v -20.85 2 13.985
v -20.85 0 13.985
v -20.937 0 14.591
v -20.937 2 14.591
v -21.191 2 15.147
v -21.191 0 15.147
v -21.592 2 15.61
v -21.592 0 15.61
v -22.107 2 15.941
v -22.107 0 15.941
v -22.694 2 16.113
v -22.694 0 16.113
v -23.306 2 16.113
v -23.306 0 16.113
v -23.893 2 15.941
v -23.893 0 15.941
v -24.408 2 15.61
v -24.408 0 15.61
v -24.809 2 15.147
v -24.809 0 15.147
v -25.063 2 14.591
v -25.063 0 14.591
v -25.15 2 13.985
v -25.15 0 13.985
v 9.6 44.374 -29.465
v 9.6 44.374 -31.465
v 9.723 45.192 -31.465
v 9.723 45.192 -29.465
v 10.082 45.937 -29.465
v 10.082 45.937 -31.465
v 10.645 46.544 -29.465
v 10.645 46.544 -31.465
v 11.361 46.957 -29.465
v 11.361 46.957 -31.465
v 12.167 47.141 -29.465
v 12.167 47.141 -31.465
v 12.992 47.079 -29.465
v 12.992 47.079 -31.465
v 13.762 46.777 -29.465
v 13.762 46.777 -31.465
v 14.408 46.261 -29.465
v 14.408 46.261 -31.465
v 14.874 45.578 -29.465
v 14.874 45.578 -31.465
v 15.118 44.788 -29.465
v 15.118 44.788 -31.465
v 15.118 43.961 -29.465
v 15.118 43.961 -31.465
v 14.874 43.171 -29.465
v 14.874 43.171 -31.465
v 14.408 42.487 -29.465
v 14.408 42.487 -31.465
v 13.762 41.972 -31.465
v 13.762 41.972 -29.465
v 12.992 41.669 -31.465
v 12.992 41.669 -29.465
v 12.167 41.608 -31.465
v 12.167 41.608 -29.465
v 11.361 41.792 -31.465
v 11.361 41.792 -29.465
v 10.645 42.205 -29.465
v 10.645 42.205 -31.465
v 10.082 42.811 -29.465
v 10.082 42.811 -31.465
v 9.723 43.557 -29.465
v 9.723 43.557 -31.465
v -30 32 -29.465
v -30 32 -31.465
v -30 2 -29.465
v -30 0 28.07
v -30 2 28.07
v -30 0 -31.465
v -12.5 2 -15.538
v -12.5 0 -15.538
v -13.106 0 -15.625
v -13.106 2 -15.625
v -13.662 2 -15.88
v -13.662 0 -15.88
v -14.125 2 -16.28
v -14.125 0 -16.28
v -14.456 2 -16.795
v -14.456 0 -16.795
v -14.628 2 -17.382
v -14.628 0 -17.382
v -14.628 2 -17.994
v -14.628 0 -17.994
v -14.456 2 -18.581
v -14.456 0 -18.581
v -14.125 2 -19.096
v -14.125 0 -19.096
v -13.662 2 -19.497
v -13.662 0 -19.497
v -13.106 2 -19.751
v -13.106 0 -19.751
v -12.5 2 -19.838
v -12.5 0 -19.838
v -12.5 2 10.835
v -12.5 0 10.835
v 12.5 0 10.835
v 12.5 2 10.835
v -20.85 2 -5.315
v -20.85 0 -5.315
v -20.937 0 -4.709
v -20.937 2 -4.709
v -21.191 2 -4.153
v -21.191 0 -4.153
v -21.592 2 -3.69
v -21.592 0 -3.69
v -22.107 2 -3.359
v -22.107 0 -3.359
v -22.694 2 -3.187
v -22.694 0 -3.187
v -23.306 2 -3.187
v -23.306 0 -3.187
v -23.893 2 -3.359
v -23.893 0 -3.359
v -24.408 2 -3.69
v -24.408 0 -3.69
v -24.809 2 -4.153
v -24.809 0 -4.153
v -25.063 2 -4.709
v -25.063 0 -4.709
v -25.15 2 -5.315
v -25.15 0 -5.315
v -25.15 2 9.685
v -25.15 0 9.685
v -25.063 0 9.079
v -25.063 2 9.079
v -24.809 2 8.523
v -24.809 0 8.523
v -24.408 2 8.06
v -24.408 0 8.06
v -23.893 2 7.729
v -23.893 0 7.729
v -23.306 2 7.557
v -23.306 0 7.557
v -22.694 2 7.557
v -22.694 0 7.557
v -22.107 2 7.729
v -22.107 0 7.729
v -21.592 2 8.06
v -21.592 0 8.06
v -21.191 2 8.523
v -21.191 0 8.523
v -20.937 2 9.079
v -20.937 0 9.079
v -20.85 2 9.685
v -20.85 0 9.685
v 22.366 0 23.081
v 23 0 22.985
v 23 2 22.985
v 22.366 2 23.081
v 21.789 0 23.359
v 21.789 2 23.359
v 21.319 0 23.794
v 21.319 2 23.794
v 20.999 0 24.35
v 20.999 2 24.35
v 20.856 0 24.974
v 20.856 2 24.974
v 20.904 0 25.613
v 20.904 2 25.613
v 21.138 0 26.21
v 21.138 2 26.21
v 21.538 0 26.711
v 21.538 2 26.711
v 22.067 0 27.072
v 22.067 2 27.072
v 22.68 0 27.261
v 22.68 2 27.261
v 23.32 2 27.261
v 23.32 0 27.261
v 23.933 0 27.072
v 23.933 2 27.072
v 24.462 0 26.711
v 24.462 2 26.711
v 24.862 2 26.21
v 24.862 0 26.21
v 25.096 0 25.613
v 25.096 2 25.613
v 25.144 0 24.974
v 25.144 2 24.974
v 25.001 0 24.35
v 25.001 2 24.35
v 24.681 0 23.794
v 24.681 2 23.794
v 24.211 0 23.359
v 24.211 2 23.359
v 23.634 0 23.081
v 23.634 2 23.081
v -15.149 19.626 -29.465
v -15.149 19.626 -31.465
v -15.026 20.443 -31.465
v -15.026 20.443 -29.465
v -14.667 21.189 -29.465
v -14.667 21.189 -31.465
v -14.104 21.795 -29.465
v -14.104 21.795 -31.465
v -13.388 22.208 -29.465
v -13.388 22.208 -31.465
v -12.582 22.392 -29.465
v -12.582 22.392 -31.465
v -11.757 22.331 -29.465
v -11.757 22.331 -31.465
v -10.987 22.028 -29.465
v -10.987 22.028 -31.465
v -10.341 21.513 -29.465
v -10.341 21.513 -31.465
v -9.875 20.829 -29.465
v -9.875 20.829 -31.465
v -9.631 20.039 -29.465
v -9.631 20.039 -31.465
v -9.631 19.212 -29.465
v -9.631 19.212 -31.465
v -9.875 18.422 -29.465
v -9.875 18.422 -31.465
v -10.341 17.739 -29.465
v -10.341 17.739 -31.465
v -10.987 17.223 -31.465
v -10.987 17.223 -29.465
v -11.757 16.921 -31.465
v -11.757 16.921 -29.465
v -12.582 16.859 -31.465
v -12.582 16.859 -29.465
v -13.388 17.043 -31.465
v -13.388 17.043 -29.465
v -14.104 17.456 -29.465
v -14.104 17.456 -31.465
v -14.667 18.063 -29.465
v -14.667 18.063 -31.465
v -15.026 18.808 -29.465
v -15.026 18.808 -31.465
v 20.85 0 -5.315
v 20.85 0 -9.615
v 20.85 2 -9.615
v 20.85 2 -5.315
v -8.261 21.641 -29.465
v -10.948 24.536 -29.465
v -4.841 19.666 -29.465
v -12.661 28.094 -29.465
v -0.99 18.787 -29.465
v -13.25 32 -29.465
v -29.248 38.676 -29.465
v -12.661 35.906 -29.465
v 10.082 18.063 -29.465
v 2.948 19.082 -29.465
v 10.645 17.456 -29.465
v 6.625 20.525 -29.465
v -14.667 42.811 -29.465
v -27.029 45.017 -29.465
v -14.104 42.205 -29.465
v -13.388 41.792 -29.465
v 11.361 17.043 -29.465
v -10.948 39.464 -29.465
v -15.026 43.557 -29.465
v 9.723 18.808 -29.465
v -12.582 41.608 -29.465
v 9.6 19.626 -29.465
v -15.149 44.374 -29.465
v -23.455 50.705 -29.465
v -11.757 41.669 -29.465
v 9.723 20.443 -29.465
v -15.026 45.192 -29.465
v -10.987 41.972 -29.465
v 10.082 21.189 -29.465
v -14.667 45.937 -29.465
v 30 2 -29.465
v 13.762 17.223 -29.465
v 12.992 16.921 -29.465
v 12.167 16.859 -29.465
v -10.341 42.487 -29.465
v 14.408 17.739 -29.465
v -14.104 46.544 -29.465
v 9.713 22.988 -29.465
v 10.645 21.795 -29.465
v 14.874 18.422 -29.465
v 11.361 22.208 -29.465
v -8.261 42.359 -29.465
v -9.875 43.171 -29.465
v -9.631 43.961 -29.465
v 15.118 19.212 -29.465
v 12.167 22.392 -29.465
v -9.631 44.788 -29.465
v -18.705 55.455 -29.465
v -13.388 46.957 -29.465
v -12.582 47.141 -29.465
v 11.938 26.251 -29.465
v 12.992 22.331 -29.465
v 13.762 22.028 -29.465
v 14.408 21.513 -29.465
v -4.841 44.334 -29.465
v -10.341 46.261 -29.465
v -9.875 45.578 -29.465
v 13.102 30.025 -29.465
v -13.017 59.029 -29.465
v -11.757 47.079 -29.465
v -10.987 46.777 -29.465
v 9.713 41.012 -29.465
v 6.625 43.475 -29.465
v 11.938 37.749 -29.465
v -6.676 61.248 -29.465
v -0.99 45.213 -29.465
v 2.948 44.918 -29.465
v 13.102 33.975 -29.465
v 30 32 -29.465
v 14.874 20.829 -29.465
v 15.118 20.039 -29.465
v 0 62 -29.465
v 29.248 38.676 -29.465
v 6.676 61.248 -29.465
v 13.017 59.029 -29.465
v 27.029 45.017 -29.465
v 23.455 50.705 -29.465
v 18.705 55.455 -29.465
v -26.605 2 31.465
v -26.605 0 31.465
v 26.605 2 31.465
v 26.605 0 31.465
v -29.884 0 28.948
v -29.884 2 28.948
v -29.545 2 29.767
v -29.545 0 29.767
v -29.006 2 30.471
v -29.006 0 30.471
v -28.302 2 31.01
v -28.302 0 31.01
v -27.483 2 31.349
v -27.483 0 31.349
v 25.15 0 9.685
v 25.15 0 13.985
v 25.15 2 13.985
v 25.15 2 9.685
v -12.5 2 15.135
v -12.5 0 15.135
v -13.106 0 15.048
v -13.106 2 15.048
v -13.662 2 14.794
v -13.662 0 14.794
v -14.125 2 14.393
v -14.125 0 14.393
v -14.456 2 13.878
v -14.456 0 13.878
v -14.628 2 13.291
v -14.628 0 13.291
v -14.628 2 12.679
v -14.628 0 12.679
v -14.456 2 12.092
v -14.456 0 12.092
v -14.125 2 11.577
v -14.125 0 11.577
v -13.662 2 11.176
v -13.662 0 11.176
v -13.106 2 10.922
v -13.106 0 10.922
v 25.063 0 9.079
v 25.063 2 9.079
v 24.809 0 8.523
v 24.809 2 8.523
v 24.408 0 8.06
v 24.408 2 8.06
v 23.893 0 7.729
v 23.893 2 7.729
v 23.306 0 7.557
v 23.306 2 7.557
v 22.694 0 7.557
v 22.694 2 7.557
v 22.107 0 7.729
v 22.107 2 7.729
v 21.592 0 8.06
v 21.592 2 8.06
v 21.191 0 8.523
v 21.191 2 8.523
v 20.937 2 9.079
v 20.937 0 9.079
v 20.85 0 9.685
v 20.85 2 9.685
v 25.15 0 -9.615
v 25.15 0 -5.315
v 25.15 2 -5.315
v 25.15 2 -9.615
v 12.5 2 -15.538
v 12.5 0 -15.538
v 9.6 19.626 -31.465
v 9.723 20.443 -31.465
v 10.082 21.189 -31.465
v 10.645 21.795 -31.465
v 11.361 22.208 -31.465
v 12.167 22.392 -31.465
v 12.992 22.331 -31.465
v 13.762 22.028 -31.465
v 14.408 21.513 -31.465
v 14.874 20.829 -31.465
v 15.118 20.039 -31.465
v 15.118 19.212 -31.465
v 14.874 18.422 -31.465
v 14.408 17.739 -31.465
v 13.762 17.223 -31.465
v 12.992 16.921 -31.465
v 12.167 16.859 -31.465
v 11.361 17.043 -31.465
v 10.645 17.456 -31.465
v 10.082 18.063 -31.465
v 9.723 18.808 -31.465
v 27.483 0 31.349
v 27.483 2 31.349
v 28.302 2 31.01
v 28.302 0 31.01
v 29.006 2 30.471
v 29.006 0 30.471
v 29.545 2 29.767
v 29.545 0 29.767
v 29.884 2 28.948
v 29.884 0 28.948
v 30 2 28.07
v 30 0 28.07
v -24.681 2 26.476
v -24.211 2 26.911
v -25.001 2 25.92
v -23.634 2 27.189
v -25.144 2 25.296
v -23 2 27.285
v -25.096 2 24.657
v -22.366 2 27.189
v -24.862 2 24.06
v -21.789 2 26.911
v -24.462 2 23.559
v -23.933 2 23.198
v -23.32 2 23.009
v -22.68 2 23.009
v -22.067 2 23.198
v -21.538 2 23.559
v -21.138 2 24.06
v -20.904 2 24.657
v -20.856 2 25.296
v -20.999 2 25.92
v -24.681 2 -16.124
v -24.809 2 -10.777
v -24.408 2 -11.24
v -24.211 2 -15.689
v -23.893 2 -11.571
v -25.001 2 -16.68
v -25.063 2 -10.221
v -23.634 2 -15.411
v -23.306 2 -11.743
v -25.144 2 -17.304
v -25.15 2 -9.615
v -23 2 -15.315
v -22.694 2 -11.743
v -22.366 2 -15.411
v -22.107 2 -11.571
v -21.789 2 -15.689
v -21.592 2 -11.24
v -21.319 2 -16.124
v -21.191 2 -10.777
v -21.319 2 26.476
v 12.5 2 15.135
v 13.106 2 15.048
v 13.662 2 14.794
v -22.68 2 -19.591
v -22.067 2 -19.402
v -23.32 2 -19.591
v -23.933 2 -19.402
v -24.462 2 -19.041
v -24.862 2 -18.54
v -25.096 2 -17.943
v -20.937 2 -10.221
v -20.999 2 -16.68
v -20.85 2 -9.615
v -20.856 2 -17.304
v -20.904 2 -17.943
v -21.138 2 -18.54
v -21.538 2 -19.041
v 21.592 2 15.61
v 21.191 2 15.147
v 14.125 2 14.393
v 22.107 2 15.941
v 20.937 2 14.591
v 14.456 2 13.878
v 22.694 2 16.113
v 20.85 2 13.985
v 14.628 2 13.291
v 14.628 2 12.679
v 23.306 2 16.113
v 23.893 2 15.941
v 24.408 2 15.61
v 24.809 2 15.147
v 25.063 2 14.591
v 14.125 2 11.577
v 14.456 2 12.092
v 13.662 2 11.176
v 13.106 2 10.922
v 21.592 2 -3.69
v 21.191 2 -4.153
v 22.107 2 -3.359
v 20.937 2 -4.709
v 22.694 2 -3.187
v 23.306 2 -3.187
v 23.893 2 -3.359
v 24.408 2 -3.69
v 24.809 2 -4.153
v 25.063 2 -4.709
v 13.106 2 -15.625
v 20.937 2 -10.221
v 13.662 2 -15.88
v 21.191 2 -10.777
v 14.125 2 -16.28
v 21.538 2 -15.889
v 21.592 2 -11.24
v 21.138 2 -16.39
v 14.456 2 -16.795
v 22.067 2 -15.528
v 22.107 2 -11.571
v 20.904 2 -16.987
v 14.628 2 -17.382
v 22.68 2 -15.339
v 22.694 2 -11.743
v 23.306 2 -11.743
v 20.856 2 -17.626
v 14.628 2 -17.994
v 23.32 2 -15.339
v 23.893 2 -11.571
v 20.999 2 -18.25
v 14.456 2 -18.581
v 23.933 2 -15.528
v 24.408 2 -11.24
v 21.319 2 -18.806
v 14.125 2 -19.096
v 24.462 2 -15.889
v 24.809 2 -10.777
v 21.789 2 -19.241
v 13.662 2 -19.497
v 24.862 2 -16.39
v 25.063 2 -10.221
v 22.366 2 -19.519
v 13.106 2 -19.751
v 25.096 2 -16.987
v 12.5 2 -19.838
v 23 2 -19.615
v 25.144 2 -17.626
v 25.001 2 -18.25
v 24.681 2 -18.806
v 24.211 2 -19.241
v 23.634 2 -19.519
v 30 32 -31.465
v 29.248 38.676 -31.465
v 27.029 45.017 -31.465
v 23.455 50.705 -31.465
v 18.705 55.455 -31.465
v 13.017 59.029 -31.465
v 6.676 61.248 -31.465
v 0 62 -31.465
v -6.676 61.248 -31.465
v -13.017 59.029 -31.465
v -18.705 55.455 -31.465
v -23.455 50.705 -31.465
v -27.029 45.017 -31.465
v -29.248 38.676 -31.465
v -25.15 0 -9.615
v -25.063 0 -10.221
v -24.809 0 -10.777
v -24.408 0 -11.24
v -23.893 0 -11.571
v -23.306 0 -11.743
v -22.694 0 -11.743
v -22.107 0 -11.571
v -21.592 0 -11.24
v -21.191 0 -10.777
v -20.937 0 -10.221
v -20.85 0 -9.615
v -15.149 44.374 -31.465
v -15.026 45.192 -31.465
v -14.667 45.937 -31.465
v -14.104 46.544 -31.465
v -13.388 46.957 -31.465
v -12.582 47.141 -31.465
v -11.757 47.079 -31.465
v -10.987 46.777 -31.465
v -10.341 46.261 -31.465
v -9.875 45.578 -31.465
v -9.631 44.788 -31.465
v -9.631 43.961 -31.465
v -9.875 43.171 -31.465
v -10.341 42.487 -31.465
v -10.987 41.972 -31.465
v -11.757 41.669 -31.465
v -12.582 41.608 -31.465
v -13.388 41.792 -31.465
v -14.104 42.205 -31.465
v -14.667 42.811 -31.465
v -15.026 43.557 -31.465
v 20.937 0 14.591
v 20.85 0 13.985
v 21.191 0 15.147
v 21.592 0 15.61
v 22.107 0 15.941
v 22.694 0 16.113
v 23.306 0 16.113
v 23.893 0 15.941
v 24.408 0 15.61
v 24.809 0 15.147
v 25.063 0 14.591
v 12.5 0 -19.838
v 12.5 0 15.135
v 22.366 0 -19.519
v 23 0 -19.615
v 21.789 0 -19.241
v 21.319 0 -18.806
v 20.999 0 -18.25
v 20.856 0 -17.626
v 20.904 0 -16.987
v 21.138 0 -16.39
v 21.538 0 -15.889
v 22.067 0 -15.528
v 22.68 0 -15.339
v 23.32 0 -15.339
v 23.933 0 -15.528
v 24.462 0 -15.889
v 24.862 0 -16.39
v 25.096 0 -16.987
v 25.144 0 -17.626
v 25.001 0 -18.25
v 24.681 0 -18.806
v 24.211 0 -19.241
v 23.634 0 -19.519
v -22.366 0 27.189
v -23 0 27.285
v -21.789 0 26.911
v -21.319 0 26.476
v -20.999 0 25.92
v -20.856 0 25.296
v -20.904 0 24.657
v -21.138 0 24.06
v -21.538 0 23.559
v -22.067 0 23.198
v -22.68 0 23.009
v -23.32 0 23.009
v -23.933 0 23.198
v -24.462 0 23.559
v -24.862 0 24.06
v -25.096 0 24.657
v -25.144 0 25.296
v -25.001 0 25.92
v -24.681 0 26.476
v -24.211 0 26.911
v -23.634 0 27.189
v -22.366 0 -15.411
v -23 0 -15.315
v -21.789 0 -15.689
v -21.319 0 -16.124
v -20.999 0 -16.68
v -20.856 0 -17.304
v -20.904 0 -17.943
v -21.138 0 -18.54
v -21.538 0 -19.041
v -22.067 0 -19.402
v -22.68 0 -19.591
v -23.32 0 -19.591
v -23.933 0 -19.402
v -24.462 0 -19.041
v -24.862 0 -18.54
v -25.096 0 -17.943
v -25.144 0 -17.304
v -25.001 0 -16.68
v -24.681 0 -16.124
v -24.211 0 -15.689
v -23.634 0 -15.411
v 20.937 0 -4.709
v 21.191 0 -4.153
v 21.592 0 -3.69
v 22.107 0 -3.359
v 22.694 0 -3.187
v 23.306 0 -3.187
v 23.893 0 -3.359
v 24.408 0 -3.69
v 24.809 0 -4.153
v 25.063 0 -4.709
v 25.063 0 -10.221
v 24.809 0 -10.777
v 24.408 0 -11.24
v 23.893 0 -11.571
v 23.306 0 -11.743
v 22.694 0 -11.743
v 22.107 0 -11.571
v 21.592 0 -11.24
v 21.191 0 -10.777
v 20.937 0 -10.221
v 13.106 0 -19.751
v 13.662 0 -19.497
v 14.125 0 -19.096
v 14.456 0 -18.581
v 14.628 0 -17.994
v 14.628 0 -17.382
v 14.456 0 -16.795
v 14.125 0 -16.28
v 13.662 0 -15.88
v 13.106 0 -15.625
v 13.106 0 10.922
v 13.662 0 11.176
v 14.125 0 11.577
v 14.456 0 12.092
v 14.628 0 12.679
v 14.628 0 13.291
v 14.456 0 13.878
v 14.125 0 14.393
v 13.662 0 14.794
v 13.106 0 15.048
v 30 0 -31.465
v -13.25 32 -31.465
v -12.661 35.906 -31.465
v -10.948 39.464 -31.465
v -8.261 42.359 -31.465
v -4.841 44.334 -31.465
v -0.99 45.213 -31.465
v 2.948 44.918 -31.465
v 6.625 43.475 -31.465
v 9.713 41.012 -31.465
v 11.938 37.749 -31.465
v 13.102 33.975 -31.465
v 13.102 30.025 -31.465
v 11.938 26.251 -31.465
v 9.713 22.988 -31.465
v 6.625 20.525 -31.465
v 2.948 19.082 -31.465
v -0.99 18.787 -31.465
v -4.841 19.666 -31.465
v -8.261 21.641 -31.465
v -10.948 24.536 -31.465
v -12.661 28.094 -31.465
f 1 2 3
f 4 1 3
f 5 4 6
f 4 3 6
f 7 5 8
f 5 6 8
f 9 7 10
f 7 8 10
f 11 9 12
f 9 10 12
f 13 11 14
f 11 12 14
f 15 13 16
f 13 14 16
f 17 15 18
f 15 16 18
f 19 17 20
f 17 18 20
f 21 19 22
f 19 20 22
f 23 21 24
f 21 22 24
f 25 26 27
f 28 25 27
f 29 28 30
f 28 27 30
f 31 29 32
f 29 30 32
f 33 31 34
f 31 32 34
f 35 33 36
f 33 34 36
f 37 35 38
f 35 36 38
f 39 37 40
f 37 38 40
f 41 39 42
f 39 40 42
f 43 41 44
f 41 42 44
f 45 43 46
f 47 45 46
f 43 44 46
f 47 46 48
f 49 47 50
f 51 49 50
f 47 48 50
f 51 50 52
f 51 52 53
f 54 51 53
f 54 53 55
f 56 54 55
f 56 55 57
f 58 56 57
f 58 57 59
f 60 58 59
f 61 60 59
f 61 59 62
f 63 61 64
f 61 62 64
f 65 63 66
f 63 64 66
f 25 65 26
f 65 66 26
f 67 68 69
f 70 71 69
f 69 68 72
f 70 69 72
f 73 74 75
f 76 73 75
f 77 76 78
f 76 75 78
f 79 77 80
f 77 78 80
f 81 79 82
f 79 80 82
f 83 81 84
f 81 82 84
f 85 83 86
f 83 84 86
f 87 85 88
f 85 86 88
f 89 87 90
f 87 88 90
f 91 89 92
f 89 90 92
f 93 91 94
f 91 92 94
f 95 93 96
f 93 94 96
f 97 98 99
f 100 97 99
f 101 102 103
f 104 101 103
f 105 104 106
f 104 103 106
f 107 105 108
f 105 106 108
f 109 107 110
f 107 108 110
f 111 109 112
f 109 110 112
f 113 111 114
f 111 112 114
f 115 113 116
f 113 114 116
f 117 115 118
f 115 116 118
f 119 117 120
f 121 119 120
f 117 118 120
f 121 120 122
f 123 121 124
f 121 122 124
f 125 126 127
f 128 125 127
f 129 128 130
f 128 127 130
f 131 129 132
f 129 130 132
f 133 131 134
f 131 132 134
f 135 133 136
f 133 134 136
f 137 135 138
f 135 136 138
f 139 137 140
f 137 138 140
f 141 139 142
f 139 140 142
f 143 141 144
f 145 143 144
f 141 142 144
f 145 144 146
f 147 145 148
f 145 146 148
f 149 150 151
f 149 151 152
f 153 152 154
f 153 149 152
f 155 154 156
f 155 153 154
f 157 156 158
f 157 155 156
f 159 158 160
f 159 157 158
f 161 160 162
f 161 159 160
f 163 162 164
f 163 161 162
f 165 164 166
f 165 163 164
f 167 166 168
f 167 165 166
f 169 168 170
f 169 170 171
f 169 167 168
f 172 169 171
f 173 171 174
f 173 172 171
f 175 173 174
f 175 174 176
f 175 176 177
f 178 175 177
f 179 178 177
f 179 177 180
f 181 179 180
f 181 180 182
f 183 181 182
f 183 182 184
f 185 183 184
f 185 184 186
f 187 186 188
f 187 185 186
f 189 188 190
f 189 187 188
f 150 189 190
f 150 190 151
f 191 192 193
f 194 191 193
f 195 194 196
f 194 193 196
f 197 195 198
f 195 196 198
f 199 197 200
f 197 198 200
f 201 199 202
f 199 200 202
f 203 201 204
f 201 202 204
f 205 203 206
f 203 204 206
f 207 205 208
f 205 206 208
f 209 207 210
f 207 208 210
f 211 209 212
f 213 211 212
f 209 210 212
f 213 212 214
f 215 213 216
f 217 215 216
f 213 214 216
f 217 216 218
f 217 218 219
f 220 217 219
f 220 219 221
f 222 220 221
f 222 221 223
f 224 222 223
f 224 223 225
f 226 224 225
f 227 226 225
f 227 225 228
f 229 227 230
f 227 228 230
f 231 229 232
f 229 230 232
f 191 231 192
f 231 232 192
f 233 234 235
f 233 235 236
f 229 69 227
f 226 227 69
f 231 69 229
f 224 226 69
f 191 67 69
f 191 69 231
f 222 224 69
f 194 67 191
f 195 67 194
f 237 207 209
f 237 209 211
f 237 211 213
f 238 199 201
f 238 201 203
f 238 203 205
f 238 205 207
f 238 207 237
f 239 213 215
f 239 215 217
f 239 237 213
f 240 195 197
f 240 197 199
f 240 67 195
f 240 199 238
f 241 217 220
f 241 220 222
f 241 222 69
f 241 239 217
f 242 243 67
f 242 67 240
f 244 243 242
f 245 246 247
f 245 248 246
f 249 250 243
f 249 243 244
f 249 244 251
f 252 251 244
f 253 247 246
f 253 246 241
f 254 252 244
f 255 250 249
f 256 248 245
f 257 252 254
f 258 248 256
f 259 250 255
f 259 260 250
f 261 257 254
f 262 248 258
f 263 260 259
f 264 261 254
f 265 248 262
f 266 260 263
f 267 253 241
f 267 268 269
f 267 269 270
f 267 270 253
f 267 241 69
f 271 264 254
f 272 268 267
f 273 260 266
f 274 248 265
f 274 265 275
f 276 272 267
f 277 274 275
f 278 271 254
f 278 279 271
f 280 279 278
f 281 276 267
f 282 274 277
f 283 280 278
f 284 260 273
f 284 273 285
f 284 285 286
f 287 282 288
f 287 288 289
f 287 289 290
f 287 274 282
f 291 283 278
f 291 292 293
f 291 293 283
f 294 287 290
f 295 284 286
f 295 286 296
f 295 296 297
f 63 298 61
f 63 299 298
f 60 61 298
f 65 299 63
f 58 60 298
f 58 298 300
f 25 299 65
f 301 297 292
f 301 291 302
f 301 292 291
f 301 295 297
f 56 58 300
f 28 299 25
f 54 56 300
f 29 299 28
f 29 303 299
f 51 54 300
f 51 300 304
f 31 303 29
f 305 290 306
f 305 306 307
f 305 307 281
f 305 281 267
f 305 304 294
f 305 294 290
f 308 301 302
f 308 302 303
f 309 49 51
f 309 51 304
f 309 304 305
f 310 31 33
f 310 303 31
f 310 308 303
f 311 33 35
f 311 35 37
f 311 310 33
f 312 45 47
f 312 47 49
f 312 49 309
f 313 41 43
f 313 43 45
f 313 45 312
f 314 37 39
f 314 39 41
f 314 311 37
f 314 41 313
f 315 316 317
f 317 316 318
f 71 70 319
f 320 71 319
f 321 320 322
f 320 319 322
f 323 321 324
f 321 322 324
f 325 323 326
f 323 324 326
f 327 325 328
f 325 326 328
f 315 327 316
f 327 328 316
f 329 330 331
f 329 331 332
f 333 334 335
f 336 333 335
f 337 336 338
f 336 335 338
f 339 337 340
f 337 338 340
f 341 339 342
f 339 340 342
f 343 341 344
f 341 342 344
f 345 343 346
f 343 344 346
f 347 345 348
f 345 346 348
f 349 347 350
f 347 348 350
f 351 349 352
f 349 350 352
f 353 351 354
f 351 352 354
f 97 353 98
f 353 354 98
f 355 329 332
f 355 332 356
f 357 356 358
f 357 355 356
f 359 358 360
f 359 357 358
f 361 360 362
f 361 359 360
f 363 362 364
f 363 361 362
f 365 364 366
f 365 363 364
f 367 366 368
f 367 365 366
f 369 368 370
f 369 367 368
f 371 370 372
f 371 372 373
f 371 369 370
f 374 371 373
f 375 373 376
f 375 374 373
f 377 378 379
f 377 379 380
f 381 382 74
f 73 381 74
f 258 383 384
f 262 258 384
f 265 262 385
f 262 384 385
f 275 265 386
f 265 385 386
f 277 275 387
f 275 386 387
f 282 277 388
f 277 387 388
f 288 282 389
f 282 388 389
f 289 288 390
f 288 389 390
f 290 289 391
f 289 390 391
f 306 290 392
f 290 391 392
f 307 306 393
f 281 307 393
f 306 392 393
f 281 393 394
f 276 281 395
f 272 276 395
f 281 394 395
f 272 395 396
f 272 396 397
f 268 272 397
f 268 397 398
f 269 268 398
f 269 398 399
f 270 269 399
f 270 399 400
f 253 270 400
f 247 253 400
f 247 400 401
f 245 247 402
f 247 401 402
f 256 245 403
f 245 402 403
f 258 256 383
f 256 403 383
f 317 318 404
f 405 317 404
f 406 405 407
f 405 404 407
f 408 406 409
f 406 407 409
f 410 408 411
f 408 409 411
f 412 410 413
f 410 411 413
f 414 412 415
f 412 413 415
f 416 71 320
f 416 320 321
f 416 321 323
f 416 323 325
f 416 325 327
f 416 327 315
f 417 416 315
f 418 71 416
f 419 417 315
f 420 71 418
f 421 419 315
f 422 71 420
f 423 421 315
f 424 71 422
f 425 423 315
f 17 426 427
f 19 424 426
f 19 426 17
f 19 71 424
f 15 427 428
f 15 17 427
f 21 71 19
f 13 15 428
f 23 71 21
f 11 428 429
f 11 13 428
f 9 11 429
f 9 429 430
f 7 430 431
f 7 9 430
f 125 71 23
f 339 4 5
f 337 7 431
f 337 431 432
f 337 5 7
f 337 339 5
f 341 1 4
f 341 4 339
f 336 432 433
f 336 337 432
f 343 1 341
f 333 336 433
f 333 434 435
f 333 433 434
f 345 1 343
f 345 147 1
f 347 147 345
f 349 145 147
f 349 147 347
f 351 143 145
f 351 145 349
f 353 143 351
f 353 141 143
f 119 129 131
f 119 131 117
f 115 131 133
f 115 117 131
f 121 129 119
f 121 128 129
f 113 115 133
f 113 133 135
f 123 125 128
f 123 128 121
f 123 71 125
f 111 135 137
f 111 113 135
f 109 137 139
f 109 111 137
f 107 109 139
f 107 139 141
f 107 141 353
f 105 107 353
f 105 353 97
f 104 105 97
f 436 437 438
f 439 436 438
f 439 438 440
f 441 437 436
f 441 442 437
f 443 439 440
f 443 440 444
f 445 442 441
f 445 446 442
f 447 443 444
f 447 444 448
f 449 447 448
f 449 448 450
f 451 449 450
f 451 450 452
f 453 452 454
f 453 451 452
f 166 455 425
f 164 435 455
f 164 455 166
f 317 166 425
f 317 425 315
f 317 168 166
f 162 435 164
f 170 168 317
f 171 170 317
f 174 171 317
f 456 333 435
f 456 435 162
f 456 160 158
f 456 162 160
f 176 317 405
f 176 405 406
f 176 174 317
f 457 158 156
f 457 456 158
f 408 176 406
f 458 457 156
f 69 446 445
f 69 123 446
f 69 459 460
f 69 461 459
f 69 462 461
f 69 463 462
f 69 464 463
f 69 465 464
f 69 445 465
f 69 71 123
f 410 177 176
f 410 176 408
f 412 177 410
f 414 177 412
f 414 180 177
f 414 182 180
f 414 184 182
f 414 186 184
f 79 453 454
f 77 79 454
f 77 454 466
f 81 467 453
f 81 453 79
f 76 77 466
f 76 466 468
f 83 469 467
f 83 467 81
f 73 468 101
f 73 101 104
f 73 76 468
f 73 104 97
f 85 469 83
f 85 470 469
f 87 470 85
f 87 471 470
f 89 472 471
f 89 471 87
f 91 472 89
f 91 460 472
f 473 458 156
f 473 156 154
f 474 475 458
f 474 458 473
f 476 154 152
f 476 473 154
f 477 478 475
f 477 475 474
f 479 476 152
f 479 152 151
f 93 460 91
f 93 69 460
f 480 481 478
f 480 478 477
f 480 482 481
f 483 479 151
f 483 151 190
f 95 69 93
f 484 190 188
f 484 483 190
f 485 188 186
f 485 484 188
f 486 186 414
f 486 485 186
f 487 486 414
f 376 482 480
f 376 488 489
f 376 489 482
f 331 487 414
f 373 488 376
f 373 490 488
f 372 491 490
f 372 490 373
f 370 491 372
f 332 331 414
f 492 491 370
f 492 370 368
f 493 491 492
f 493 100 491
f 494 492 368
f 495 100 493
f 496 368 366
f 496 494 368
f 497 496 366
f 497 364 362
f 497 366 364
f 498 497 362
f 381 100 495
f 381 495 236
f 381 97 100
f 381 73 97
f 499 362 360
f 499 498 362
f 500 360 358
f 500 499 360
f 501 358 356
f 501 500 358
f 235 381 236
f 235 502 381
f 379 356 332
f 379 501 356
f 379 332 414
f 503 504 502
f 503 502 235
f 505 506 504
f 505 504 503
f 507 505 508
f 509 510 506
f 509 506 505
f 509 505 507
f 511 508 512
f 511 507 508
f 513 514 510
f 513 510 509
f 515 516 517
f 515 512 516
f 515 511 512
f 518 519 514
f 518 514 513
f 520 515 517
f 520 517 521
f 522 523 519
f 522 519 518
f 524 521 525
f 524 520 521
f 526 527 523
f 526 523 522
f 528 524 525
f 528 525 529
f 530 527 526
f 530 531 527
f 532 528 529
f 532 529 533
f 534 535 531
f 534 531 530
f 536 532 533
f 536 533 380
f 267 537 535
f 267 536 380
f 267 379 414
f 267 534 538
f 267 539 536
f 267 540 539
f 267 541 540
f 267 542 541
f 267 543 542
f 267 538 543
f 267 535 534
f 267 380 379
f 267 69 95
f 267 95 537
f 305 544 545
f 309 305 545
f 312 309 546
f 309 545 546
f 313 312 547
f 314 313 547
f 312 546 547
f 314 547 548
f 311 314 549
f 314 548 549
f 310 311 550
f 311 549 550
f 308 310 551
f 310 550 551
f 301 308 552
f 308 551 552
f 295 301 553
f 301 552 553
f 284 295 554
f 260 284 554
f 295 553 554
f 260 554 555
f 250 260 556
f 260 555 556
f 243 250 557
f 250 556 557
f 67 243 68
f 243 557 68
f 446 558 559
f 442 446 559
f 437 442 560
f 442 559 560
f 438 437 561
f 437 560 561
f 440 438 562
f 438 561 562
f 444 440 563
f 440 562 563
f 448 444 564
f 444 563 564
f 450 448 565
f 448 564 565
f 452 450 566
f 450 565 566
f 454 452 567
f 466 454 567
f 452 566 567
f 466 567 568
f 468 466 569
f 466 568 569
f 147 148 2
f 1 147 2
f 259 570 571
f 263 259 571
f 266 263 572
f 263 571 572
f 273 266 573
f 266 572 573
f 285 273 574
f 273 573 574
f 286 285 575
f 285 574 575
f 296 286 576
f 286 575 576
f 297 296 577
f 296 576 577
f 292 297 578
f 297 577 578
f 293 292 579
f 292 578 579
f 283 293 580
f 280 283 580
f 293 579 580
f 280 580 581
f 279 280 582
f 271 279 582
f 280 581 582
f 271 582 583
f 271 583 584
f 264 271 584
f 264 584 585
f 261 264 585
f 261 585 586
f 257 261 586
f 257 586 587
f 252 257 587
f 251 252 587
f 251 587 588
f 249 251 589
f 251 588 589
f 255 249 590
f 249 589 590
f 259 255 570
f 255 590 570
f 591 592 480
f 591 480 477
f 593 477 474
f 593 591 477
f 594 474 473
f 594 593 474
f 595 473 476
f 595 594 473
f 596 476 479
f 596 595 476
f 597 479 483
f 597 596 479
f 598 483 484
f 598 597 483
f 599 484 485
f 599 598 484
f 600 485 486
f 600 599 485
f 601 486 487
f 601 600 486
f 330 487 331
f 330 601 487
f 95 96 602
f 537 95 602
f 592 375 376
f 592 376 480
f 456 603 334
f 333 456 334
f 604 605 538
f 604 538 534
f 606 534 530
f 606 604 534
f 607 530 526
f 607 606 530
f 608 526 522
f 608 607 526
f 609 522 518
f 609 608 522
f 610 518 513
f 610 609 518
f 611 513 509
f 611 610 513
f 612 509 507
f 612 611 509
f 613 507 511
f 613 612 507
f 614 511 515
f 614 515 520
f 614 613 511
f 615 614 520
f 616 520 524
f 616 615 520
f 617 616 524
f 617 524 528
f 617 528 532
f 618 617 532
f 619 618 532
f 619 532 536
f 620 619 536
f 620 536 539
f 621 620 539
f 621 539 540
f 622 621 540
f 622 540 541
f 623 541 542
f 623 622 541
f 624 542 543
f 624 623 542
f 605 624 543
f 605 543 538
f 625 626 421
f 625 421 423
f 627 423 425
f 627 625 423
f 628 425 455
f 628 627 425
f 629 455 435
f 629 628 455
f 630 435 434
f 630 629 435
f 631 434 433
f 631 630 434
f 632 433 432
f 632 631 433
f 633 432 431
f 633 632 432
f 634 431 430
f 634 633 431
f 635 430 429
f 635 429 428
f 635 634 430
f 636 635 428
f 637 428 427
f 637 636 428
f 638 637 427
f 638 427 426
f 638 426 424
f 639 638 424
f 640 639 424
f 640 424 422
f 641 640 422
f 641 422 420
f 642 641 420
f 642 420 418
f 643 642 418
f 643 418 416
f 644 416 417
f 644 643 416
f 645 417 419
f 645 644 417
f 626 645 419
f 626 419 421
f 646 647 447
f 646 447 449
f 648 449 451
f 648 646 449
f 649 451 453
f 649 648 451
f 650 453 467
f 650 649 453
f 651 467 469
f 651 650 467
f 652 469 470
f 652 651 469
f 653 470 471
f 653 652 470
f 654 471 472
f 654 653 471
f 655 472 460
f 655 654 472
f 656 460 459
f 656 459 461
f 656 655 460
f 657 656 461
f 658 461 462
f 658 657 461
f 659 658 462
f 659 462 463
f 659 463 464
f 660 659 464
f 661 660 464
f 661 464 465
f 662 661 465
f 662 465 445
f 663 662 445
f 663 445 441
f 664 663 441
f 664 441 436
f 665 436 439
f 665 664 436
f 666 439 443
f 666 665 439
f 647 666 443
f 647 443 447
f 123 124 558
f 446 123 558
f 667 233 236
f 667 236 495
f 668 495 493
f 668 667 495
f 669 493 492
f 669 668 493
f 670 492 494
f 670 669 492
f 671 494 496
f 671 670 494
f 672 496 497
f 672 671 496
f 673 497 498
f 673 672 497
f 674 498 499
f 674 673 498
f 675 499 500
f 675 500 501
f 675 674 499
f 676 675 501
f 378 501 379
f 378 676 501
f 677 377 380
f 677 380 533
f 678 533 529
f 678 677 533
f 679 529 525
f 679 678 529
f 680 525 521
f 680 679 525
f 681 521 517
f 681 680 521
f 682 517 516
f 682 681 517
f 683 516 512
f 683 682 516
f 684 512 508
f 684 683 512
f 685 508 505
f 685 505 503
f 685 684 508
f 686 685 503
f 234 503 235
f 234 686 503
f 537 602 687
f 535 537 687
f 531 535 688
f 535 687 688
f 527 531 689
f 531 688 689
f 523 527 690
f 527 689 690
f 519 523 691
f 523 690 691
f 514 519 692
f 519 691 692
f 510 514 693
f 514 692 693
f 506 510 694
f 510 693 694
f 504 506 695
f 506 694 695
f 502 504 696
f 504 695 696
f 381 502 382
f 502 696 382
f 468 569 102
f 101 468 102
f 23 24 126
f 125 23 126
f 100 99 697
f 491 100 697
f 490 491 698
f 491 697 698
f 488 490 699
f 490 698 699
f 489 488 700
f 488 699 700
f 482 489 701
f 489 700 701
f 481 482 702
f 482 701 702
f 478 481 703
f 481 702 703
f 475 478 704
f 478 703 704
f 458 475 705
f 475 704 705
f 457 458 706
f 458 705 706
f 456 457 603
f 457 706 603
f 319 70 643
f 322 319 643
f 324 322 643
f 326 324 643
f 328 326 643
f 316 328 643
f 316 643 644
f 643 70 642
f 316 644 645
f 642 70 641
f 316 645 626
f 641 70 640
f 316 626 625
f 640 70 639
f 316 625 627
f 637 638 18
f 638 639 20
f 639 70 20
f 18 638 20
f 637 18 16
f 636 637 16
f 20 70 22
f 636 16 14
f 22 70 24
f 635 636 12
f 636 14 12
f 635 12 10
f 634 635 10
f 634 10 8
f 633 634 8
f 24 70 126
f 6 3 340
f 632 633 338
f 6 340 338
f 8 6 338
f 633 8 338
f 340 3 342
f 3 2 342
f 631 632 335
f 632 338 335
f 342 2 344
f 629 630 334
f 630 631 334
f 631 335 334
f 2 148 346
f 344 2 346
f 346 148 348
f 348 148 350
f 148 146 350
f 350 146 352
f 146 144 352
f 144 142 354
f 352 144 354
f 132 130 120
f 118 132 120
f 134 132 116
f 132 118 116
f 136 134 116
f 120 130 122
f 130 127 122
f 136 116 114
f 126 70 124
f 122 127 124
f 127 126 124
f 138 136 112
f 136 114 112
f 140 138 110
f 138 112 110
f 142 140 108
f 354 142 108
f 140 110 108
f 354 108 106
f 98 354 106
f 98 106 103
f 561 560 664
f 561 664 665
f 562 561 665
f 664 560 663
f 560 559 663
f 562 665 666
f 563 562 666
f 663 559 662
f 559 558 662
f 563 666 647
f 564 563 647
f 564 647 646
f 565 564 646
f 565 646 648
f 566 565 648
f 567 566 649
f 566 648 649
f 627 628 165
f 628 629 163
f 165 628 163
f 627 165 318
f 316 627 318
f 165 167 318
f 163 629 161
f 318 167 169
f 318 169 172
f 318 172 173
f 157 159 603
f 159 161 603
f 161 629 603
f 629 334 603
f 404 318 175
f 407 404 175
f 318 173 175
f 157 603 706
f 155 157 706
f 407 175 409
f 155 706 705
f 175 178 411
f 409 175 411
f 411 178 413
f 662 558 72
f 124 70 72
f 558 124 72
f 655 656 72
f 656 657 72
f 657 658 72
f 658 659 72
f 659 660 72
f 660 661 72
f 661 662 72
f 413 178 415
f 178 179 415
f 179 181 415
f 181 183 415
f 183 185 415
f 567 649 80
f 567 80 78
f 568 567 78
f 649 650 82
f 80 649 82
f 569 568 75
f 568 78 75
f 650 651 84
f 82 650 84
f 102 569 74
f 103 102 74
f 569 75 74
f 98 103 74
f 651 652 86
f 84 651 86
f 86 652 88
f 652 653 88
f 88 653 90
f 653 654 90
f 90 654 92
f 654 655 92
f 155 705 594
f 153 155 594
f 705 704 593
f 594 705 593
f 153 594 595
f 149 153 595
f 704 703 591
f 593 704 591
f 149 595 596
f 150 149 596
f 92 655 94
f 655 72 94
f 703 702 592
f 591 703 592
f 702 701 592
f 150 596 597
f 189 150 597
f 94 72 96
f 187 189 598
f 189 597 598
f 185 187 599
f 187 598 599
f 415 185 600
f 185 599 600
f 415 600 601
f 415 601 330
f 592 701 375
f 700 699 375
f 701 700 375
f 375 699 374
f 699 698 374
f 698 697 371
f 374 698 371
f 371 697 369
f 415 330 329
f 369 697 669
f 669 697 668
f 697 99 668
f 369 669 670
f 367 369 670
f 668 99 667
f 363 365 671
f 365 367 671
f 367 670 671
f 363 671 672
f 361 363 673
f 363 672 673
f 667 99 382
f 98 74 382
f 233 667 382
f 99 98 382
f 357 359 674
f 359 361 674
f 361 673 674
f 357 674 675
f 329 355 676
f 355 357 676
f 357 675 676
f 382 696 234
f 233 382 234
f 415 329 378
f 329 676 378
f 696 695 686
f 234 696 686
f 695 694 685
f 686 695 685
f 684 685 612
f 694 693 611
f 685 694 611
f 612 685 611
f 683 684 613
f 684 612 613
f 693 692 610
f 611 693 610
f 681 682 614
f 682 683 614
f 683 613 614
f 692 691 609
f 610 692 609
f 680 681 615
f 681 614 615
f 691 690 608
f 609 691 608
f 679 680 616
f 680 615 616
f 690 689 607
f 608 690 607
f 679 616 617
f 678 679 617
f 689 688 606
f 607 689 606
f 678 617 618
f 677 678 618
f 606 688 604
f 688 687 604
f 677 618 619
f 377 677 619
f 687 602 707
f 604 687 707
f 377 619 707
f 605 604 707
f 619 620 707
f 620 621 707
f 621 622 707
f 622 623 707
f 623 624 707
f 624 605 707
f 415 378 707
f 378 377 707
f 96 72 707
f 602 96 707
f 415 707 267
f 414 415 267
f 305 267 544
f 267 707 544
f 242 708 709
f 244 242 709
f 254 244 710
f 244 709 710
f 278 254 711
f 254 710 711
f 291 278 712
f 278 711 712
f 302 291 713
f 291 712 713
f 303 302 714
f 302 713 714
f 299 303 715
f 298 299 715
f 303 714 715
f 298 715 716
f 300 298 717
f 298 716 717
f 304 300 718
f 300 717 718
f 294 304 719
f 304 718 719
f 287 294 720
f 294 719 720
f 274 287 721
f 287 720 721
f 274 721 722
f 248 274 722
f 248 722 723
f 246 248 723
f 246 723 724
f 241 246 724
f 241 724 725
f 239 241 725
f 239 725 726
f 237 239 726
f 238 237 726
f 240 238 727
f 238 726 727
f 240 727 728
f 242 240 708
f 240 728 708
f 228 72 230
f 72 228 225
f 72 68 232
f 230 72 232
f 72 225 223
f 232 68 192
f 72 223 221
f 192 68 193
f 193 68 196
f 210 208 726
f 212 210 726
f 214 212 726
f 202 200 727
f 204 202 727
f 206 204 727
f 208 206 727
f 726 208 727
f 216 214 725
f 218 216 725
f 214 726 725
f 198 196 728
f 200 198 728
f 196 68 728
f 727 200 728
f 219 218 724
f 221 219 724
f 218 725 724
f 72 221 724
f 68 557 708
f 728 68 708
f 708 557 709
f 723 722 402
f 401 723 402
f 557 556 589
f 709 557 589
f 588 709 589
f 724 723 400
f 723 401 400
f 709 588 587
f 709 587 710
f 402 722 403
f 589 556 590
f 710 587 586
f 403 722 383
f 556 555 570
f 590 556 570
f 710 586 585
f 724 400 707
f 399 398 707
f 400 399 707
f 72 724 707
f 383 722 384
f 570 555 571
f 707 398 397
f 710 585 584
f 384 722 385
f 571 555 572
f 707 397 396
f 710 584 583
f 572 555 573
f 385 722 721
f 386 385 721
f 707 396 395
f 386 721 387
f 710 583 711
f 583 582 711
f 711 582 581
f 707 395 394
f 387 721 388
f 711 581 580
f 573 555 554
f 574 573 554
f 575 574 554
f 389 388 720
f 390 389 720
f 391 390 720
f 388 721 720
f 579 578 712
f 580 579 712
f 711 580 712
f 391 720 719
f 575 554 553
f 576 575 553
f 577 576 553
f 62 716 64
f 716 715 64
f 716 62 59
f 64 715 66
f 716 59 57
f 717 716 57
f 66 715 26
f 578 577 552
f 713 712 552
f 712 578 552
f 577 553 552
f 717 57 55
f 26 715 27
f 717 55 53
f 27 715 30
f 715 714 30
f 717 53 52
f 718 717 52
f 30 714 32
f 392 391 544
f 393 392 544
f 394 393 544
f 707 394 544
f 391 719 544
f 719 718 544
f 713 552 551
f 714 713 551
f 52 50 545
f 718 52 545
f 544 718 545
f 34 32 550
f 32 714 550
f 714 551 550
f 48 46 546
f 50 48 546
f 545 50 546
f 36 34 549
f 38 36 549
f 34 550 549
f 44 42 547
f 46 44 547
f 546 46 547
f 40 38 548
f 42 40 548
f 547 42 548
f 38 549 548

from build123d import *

# Parameters (mm, degrees)
SKETCH1_R           = 2.15
BOSS_EXTRUDE1_DEPTH = 2
SKETCH5_R           = 2.774437445
SKETCH5_R_2         = 13.25
BOSS_EXTRUDE2_DEPTH = 2


with BuildPart() as part:
    # Sketch1 → Boss-Extrude1 (new body)
    with BuildSketch(Plane(origin=(0, 0, 0), x_dir=(1, 0, 0), z_dir=(0, 1, 0))):
        with BuildLine():
            Line((-26.604565316, -31.465), (26.604565316, -31.465))
            ThreePointArc((26.604565316, -31.465), (29.005500206, -30.470500206), (30, -28.069565316))
            Line((30, -28.069565316), (30, 31.465))
            Line((30, 31.465), (-30, 31.465))
            Line((-30, 31.465), (-30, -28.069565316))
            ThreePointArc((-30, -28.069565316), (-29.005500206, -30.470500206), (-26.604565316, -31.465))
        make_face()
        with Locations(Location((-23, -25.135, 0), (0, 0, 270))):
            Circle(SKETCH1_R, mode=Mode.SUBTRACT)
        with Locations(Location((-23, 17.465, 0), (0, 0, 270))):
            Circle(SKETCH1_R, mode=Mode.SUBTRACT)
        with Locations(Location((23, -25.135, 0), (0, 0, 90))):
            Circle(SKETCH1_R, mode=Mode.SUBTRACT)
        with Locations(Location((23, 17.465, 0), (0, 0, 90))):
            Circle(SKETCH1_R, mode=Mode.SUBTRACT)
        with BuildLine():
            Line((-12.5, 19.838201533), (12.5, 19.838201533))
            ThreePointArc((12.5, 19.838201533), (14.65, 17.688201533), (12.5, 15.538201533))
            Line((12.5, 15.538201533), (-12.5, 15.538201533))
            ThreePointArc((-12.5, 15.538201533), (-14.65, 17.688201533), (-12.5, 19.838201533))
        make_face(mode=Mode.SUBTRACT)
        with BuildLine():
            Line((-20.85, 9.615), (-20.85, 5.315))
            ThreePointArc((-20.85, 5.315), (-23, 3.165), (-25.15, 5.315))
            Line((-25.15, 5.315), (-25.15, 9.615))
            ThreePointArc((-25.15, 9.615), (-23, 11.765), (-20.85, 9.615))
        make_face(mode=Mode.SUBTRACT)
        with BuildLine():
            Line((-20.85, -9.685), (-20.85, -13.985))
            ThreePointArc((-20.85, -13.985), (-23, -16.135), (-25.15, -13.985))
            Line((-25.15, -13.985), (-25.15, -9.685))
            ThreePointArc((-25.15, -9.685), (-23, -7.535), (-20.85, -9.685))
        make_face(mode=Mode.SUBTRACT)
        with BuildLine():
            Line((-12.5, -10.835), (12.5, -10.835))
            ThreePointArc((12.5, -10.835), (14.65, -12.985), (12.5, -15.135))
            Line((12.5, -15.135), (-12.5, -15.135))
            ThreePointArc((-12.5, -15.135), (-14.65, -12.985), (-12.5, -10.835))
        make_face(mode=Mode.SUBTRACT)
        with BuildLine():
            Line((20.85, -9.685), (20.85, -13.985))
            ThreePointArc((20.85, -13.985), (23, -16.135), (25.15, -13.985))
            Line((25.15, -13.985), (25.15, -9.685))
            ThreePointArc((25.15, -9.685), (23, -7.535), (20.85, -9.685))
        make_face(mode=Mode.SUBTRACT)
        with BuildLine():
            Line((20.85, 9.615), (20.85, 5.315))
            ThreePointArc((20.85, 5.315), (23, 3.165), (25.15, 5.315))
            Line((25.15, 5.315), (25.15, 9.615))
            ThreePointArc((25.15, 9.615), (23, 11.765), (20.85, 9.615))
        make_face(mode=Mode.SUBTRACT)
    extrude(amount=BOSS_EXTRUDE1_DEPTH)

    # Sketch5 → Boss-Extrude2 (add)
    with BuildSketch(Plane(origin=(0, 0, -31.465), x_dir=(-1, 0, 0), z_dir=(0, 0, -1))):
        with BuildLine():
            ThreePointArc((-30, 32), (0, 62), (30, 32))
            Line((30, 32), (30, 2))
            Line((30, 2), (-30, 2))
            Line((-30, 2), (-30, 32))
        make_face()
        with Locations((12.374368671, 19.625631329)):
            Circle(SKETCH5_R, mode=Mode.SUBTRACT)
        with Locations((-12.374368671, 19.625631329)):
            Circle(SKETCH5_R, mode=Mode.SUBTRACT)
        with Locations((-12.374368671, 44.374368671)):
            Circle(SKETCH5_R, mode=Mode.SUBTRACT)
        with Locations((12.374368671, 44.374368671)):
            Circle(SKETCH5_R, mode=Mode.SUBTRACT)
        with Locations((0, 32)):
            Circle(SKETCH5_R_2, mode=Mode.SUBTRACT)
    extrude(amount=-BOSS_EXTRUDE2_DEPTH)


solid = part.part
